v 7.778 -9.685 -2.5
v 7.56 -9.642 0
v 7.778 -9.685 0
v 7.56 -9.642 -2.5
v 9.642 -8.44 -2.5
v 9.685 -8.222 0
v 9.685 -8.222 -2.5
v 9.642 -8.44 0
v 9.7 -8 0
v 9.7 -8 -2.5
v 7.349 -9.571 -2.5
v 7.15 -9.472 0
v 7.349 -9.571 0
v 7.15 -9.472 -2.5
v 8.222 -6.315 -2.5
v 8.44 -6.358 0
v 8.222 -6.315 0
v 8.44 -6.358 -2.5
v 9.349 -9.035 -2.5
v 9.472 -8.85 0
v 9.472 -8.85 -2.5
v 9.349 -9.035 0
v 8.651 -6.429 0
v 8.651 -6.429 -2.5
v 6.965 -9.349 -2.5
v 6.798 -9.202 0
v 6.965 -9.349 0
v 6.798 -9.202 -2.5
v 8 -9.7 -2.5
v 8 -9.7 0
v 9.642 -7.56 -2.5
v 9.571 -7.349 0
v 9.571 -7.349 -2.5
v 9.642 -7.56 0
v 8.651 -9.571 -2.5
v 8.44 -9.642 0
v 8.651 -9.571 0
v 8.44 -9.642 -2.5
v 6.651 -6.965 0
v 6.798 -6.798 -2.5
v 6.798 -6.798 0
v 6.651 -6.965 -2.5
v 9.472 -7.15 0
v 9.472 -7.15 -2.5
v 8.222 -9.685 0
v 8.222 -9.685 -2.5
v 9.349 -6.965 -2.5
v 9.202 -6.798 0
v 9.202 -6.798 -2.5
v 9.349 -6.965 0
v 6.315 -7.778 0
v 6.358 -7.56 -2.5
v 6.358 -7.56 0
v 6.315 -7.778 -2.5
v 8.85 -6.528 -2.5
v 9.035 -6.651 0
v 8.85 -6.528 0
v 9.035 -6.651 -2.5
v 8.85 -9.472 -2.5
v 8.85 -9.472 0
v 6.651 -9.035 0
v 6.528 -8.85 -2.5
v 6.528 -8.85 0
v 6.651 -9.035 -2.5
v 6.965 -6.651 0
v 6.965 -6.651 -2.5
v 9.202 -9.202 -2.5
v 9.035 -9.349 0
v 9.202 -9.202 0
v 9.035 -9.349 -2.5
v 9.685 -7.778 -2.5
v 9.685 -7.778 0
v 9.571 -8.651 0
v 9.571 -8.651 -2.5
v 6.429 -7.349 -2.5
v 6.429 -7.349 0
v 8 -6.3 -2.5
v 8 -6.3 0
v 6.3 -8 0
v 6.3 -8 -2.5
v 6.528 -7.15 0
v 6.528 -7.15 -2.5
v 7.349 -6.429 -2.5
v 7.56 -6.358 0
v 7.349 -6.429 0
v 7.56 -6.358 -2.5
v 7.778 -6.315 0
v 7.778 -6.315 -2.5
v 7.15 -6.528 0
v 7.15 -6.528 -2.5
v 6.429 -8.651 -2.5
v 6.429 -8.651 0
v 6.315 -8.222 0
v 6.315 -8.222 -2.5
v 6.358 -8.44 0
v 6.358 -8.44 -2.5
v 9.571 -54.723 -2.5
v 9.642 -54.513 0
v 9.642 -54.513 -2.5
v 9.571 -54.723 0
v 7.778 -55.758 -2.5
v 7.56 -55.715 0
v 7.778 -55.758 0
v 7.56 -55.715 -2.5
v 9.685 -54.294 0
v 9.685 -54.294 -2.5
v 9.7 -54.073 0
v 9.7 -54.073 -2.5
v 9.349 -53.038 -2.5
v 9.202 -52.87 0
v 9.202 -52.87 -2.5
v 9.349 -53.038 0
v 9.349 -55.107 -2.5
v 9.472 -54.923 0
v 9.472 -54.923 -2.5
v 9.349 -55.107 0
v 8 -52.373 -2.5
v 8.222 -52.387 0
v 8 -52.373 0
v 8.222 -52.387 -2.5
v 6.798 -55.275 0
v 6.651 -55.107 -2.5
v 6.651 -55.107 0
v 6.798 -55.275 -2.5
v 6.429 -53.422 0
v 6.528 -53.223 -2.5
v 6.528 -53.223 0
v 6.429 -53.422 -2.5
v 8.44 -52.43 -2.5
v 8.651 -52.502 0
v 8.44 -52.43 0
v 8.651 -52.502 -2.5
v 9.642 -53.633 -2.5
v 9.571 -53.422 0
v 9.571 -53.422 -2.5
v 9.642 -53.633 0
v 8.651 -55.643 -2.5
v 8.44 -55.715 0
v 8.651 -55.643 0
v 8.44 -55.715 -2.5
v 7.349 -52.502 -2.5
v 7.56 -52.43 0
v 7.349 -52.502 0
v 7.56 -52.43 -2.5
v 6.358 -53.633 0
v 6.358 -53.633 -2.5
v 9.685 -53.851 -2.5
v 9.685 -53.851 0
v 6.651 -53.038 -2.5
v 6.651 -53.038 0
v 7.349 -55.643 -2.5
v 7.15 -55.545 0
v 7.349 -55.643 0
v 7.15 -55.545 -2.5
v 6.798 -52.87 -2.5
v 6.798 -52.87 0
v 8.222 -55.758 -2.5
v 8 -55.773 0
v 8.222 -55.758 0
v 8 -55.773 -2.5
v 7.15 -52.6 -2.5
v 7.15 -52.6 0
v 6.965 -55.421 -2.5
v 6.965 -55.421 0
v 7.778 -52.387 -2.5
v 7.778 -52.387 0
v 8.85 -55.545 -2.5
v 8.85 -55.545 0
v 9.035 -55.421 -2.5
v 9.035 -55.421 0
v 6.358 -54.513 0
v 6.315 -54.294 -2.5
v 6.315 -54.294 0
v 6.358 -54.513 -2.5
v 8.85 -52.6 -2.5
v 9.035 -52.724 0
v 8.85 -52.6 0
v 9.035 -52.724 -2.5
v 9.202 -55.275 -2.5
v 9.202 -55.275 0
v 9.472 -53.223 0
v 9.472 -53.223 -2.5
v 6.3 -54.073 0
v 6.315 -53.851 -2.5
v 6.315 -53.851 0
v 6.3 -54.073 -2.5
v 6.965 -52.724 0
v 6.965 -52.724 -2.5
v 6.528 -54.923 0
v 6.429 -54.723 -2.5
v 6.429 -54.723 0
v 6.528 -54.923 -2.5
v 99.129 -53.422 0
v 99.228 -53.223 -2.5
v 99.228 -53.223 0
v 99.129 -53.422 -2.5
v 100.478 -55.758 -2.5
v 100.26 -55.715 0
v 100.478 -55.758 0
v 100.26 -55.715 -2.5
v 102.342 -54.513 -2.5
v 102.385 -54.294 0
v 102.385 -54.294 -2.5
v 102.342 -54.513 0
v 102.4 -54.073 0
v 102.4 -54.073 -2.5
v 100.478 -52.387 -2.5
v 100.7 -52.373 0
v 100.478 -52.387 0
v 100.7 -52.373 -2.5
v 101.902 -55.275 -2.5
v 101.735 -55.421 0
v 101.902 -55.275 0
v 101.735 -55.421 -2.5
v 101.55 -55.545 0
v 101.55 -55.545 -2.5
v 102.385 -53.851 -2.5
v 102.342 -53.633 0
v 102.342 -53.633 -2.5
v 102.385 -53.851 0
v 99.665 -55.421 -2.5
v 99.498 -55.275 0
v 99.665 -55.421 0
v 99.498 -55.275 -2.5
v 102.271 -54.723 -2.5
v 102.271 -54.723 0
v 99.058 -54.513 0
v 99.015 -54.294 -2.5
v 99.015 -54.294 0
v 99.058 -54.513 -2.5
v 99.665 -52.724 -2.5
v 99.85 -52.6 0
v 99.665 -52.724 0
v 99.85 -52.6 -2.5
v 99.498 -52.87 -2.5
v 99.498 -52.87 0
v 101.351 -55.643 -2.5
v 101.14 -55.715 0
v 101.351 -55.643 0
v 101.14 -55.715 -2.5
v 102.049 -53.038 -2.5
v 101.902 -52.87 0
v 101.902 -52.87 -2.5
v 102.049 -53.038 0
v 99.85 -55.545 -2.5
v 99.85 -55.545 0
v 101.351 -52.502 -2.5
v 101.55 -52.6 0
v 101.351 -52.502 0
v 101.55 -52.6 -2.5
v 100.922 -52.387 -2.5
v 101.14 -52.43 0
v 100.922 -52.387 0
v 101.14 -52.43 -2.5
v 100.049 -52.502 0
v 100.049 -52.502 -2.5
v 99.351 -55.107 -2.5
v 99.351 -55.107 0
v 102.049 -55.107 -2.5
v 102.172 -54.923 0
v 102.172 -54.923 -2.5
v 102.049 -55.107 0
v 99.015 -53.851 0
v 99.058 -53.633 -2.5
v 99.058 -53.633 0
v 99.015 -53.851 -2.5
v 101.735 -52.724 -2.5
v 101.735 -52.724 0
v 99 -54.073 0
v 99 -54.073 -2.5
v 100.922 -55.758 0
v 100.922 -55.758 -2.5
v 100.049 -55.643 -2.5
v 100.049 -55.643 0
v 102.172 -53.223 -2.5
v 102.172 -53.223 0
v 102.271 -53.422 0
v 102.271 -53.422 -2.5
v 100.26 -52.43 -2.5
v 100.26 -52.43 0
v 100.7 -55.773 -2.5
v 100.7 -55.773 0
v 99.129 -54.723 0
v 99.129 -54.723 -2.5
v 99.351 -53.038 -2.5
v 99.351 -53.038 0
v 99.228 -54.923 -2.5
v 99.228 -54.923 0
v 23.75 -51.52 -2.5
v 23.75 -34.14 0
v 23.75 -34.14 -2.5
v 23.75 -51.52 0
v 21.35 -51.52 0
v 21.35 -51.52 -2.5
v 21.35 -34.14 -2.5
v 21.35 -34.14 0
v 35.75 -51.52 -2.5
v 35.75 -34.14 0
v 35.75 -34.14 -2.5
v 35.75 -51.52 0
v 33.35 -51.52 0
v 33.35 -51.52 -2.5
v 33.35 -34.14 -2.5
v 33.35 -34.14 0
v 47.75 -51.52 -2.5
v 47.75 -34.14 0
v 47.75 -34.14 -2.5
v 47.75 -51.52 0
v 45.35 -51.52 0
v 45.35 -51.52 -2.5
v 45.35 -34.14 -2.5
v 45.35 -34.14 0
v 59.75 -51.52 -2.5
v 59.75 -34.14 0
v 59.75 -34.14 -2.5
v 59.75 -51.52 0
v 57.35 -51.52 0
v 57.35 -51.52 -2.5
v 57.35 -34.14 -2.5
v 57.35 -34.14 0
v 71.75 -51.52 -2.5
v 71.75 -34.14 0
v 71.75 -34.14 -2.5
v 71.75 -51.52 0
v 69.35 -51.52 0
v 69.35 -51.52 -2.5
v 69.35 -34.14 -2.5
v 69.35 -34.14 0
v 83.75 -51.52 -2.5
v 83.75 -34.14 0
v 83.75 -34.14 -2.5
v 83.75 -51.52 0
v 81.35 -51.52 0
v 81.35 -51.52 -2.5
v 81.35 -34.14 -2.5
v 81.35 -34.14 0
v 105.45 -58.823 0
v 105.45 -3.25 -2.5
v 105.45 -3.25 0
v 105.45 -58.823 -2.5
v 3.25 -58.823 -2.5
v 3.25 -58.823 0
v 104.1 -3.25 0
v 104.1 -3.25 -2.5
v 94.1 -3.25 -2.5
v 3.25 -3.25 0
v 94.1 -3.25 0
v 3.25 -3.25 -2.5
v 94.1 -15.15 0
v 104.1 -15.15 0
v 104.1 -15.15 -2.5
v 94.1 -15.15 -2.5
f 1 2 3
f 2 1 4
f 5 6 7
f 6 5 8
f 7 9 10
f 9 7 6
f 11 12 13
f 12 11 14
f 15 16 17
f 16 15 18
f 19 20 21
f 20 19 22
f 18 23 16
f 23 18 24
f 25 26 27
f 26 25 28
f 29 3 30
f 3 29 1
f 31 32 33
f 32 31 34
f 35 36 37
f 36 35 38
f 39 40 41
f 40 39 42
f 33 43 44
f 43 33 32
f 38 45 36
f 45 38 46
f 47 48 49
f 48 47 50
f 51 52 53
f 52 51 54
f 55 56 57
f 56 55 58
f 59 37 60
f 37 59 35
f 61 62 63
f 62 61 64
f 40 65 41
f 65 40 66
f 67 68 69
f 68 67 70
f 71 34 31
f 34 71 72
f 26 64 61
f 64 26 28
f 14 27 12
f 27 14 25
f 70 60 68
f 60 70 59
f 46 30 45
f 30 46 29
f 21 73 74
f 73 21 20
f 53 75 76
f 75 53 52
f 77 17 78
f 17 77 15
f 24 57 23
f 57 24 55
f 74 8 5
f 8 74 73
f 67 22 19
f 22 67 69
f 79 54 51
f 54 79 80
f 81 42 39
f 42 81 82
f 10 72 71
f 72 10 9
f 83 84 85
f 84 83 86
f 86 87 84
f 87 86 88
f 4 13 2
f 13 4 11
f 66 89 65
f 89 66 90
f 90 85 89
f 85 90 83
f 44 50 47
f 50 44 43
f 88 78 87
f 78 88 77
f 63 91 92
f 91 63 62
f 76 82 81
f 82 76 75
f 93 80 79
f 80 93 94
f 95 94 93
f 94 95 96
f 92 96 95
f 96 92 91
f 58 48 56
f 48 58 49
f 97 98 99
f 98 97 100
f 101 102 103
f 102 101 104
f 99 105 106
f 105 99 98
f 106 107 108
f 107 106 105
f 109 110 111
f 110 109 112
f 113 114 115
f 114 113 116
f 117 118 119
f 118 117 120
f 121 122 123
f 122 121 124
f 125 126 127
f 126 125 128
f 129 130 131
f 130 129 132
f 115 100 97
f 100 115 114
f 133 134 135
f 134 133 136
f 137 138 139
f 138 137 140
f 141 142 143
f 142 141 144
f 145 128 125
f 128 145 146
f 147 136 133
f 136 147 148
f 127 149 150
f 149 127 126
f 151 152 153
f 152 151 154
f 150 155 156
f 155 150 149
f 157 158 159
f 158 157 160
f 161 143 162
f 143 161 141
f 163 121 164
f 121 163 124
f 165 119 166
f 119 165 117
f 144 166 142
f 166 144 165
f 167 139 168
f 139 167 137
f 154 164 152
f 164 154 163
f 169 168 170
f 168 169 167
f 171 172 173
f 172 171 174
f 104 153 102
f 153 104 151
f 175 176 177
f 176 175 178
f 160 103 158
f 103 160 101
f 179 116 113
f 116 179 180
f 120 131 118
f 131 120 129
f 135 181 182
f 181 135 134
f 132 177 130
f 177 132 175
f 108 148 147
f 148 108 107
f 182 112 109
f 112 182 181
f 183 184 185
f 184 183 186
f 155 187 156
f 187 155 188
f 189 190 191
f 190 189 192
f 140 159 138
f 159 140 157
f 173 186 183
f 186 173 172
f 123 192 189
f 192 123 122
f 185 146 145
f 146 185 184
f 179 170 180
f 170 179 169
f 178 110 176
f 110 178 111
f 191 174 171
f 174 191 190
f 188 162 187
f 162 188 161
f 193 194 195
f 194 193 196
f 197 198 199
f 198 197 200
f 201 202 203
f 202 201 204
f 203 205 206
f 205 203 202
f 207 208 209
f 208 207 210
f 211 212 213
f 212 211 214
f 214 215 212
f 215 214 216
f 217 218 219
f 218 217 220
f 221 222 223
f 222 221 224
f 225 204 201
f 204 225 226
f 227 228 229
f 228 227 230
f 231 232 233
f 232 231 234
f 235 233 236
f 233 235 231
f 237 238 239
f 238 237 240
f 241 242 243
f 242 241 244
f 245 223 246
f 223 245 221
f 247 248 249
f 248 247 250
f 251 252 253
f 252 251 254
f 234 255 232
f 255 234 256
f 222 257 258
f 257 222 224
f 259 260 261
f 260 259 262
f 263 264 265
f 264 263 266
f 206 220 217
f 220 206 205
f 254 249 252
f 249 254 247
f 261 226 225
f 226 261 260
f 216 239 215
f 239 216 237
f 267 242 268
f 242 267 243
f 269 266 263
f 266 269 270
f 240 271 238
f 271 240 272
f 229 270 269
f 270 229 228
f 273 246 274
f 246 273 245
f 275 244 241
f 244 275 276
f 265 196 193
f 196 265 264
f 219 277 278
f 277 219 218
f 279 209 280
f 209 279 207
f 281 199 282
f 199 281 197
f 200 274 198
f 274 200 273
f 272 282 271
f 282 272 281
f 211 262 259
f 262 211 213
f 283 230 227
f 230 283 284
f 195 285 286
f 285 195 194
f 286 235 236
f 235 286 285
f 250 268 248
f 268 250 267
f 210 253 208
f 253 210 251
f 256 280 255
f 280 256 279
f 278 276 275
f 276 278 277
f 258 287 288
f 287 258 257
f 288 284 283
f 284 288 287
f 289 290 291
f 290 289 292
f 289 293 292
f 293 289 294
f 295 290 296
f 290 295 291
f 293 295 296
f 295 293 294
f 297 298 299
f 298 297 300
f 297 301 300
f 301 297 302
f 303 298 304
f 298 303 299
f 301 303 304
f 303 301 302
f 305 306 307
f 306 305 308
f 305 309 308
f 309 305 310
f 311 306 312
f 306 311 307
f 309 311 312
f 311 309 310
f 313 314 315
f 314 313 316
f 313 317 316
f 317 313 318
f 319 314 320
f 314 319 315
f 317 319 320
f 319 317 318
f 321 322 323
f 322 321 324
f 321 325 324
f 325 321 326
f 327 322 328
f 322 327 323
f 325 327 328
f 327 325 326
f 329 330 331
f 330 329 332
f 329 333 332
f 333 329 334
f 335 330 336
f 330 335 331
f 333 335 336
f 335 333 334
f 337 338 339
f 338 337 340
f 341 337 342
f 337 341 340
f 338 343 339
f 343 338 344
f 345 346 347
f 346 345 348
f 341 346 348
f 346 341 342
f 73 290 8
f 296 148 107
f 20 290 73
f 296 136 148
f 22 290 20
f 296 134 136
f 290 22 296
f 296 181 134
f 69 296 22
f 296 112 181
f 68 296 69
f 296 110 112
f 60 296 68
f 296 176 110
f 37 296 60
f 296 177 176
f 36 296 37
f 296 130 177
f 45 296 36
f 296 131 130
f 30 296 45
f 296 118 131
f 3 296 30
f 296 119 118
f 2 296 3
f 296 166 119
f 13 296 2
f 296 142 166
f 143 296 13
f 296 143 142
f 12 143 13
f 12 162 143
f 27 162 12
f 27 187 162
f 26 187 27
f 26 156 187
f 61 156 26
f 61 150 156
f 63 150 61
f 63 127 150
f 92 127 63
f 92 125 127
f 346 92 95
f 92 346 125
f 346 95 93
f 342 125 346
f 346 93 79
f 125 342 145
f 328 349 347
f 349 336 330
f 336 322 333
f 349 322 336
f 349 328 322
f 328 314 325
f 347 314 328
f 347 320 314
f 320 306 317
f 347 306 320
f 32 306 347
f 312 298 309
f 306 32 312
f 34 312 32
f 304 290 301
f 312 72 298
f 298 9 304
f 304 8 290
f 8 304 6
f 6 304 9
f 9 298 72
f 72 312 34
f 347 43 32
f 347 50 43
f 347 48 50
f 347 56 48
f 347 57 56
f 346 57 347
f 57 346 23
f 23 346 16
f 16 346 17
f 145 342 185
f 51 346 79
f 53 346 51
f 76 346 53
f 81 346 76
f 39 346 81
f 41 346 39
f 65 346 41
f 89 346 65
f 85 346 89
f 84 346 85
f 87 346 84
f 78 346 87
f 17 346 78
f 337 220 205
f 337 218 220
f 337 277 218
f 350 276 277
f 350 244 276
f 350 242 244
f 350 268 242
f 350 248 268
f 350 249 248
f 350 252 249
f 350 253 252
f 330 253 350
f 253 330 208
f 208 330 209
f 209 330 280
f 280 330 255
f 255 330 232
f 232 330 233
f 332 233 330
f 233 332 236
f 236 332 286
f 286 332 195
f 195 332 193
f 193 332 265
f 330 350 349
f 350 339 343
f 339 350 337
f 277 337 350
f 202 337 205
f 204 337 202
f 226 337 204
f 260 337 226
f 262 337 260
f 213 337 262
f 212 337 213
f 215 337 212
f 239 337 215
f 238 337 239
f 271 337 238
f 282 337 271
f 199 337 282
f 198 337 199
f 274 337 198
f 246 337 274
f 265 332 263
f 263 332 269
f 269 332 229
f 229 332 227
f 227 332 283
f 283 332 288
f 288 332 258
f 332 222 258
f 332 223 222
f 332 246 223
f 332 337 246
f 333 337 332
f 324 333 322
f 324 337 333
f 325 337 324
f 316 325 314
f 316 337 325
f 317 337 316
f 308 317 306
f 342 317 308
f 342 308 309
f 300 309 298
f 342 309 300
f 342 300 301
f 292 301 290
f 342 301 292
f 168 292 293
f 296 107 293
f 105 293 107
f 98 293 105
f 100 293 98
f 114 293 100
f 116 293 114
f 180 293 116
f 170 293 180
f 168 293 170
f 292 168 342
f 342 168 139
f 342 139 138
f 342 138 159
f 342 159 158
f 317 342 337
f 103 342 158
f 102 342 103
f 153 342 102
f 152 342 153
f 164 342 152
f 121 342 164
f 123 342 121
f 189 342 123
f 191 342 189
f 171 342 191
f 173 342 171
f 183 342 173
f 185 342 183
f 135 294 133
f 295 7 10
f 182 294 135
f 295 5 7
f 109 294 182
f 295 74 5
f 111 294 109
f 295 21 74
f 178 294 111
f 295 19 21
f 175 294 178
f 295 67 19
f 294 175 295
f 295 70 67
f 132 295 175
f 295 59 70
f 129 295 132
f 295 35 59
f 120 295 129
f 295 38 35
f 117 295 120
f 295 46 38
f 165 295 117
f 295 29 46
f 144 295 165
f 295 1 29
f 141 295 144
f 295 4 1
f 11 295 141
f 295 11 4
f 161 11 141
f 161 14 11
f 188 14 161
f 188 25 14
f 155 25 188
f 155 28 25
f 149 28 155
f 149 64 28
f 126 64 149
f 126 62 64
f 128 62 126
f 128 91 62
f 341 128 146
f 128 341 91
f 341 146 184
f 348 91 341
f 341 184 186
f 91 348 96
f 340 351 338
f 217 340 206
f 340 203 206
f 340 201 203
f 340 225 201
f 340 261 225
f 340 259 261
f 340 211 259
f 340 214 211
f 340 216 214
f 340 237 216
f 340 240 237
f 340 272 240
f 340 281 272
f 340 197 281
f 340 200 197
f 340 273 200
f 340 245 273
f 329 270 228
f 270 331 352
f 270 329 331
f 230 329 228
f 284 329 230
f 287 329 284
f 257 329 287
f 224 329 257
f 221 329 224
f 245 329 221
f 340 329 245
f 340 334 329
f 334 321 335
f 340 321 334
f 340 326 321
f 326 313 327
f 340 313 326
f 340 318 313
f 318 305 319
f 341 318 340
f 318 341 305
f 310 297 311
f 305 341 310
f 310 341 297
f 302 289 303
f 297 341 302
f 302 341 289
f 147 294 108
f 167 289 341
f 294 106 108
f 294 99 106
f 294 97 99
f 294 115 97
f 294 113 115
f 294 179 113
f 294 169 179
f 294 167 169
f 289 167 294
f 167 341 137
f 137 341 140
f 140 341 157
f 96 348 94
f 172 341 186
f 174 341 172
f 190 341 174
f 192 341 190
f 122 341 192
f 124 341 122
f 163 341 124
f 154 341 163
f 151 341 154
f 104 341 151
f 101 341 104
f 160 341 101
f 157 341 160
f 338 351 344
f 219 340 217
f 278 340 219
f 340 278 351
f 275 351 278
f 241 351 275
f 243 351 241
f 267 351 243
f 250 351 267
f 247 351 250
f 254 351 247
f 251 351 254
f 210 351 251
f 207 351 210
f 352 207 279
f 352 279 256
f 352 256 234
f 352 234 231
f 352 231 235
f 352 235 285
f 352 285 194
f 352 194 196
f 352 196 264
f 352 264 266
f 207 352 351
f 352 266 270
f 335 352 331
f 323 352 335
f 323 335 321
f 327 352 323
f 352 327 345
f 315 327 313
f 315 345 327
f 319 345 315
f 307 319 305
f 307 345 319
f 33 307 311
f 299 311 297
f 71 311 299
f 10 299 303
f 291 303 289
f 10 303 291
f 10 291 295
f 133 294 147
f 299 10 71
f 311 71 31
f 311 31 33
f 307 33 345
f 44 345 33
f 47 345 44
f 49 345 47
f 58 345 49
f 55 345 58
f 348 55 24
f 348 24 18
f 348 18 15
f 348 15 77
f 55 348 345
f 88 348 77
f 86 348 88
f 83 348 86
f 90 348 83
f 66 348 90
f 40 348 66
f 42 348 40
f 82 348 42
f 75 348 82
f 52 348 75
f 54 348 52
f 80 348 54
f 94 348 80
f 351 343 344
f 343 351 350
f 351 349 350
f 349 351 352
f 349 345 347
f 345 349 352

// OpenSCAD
// =====================================================================
//  CYD ADS-B RADAR — 30° wedge console enclosure
//  Board: ESP32-2432S028R "Cheap Yellow Display", dual-USB variant
//  Landscape, SD end = LEFT, USB end = RIGHT (internal cable pocket),
//  cable exits low through the rear panel.
//
//  Parts:  part = "assembly"    exploded-ish preview with ghost board
//                 "body"        wedge body, as-installed orientation
//                 "body_print"  wedge body, bezel face down (print this)
//                 "panel"       rear panel (prints flat as-is)
//                 "fit_test"    bezel face + bosses only — print FIRST
//
//  Hardware: 4x M3x6 self-tap (board -> bezel bosses)
//            4x M3x8 self-tap (panel -> corner bosses)
// =====================================================================

part       = "panel";
show_board = true;          // ghost board in assembly view
$fn = 48;

/* ---------------- board — VERIFY tagged values with calipers ------- */
board_w    = 86.5;
board_h    = 50.0;
board_t    = 1.6;
hole_d     = 3.2;
hole_inset = 4.0;   // VERIFY: mounting hole centre inset from corners
glass_lift = 4.0;    // VERIFY: glass surface height above PCB top
disp_w     = 69.5;   // VERIFY: display module (metal frame) outline, lateral
disp_h     = 50.5;   // VERIFY: module outline, along slant
disp_du    = 0;      // VERIFY: module centre offset from board centre (+ = toward USB)
disp_dv    = 0;      // VERIFY: module centre offset along slant
view_du = -3;   // aperture offset within the module — display active area
                // sits left-of-centre (3mm dead border on the right side)
view_dv = 0;    // same idea vertically, if it ever needs it
view_w     = 60.0;   // bezel opening (active area is 57.6 x 43.2)
view_h     = 45.0;
sd_dv      = 0;      // VERIFY: microSD position along left edge
comp_back  = 12;     // clearance behind PCB (ESP32 can, connectors)

/* ---------------- enclosure ---------------- */
tilt         = 30;    // back-tilt, degrees
wall         = 3.0;
lip          = 1.2;   // bezel overlap onto glass edge
glass_gap    = 0.3;   // air gap between lip underside and glass
clr          = 0.6;   // board fit clearance
usb_pocket   = 15;    // extra cavity width, USB side (plug + 90° bend)
D            = 55;    // overall depth front-toe to back
panel_t      = 2.5;
fit          = 0.25;  // panel fit clearance
boss_d       = 7;
pilot_d      = 2.6;   // M3 self-tap pilot
clear_d      = 3.4;   // M3 clearance
cable_slot_w = 10;
cable_slot_h = 12;
chin      = 10;   // foot height below the screen face
chin_rake = 15;   // chin leans back this many degrees.
                  // At tilt=30, rake >= 15 keeps the chin printable
                  // face-down (<= 45° overhang). Also looks less like a doorstop.

/* ---------------- derived ---------------- */
standoff_h = lip + glass_gap + glass_lift - wall;   // inner face -> PCB top
cav_slant  = board_h + 2*clr + 2;                   // cavity length along slant
int_w      = board_w + 2*clr + usb_pocket;          // cavity width
out_w      = int_w + 2*wall;                        // overall width
bcx        = wall + clr + board_w/2;                // board centre, global X
pcb_depth  = wall + standoff_h;                     // outer face -> PCB top
cable_x    = bcx + board_w/2 + 4 + cable_slot_w/2;  // rear slot centre
ldr_du = -(board_w/2 - hole_inset);        // same column as the left holes
ldr_dv = -(board_h/2 - hole_inset) + 7;    // ~9mm above hole centre — VERIFY
top_z = chin + cav_slant*cos(tilt) + 2*wall;
s_c   = (top_z - chin) / (2*cos(tilt));

assert(standoff_h >= 0.8,
  "standoff_h too small — thin the wall or check glass_lift");

/* ---------------- helpers ---------------- */
// extrude a 2D side profile (drawn as [depth, height]) along X
module extrude_x(l) { rotate([90,0,90]) linear_extrude(height=l) children(); }

// face frame: origin on OUTER bezel surface, +Z out of the face,
// fx = lateral (global X), fs = distance up the slant from the toe
module on_face(fx, fs) {
  translate([fx, fs*sin(tilt), chin + fs*cos(tilt)])
    rotate([90 - tilt, 0, 0]) children();
}
// same, relative to board centre
module on_board(u, v) { on_face(bcx + u, s_c + v) children(); }

/* ---------------- profiles ---------------- */
module prof_out() {
  polygon([[chin*tan(chin_rake), 0], [0, chin],
           [(top_z - chin)*tan(tilt), top_z], [D, top_z], [D, 0]]);
}
module prof_cav() {
  offset(delta = -wall)
    polygon([[chin*tan(chin_rake), 0], [0, chin],
             [(top_z - chin)*tan(tilt), top_z], [D + 20, top_z], [D + 20, 0]]);
}

/* ---------------- panel boss layout ---------------- */
pb = [[wall + 5,          wall + 5],
      [out_w - wall - 5,  wall + 5],
      [wall + 5,          top_z - wall - 5],
      [out_w - wall - 5,  top_z - wall - 5]];
pboss_len = 12;

/* ---------------- wedge body ---------------- */
module body() {
  difference() {
    union() {
      // shell = outline minus cavity, done FIRST so the bosses
      // added below survive (previously the cavity cut ate them)
      difference() {
        extrude_x(out_w) prof_out();
        translate([wall, 0, 0]) extrude_x(int_w) prof_cav();
      }
      // board standoff bosses on the inner bezel face
      for (sx = [-1,1], sy = [-1,1])
        on_board(sx*(board_w/2 - hole_inset), sy*(board_h/2 - hole_inset))
          translate([0,0, -wall - standoff_h])
            cylinder(h = standoff_h + 0.02, d = boss_d);
      // rear panel bosses — fattened so they fuse into the corner walls
      for (p = pb)
        translate([p[0], D - pboss_len, p[1]])
          rotate([-90,0,0]) cylinder(h = pboss_len, d = boss_d + 3);
    }

// view aperture
    on_board(disp_du + view_du, disp_dv + view_dv)
      cube([view_w, view_h, 4*wall], center = true);

    // display module pocket
    on_board(disp_du, disp_dv)
      translate([0,0, -lip - 7.5])
        cube([disp_w + 0.6, disp_h + 0.6, 15], center = true);

    // LDR light path + chamfer
    on_board(ldr_du, ldr_dv) {
      translate([0,0, -wall - 1]) cylinder(h = wall + 2, d = 3);
      translate([0,0, -1.2]) cylinder(h = 1.25, d1 = 3, d2 = 5.5);
    }

    // board screw pilots
    for (sx = [-1,1], sy = [-1,1])
      on_board(sx*(board_w/2 - hole_inset), sy*(board_h/2 - hole_inset))
        translate([0,0, -wall - standoff_h - 0.1])
          cylinder(h = standoff_h + wall - 1, d = pilot_d);

    // panel screw pilots
    for (p = pb)
      translate([p[0], D + 1, p[1]])
        rotate([90,0,0]) cylinder(h = pboss_len - 1, d = pilot_d);
  }
}

/* ---------------- rear panel ---------------- */
module panel() {
  px0 = wall + fit;  px1 = out_w - wall - fit;
  pz0 = wall + fit;  pz1 = top_z - wall - fit;
  difference() {
    translate([px0, D - panel_t, pz0])
      cube([px1 - px0, panel_t, pz1 - pz0]);
    // screw clearance
    for (p = pb)
      translate([p[0], D + 1, p[1]])
        rotate([90,0,0]) cylinder(h = panel_t + 2, d = clear_d);
    // cable exit notch, bottom edge, over the USB pocket
    translate([cable_x - cable_slot_w/2, D - panel_t - 1, pz0 - 0.1])
      cube([cable_slot_w, panel_t + 2, cable_slot_h]);
    // vents
    for (i = [0:5])
      translate([out_w/2 - 33 + i*12, D - panel_t - 1, top_z*0.55])
        cube([2.4, panel_t + 2, top_z*0.28]);
  }
}

/* ---------------- ghost board ---------------- */
module board_mock() {
  color("green", 0.4) on_board(0, 0)
    translate([0,0, -pcb_depth - board_t/2])
      cube([board_w, board_h, board_t], center = true);
  color("grey", 0.4) on_board(disp_du, disp_dv)
    translate([0,0, -pcb_depth + glass_lift/2])
      cube([disp_w, disp_h, glass_lift], center = true);
}

/* ---------------- part selection ---------------- */
if (part == "assembly") {
  body();
  color("orange", 0.7) panel();
  if (show_board) board_mock();
}
if (part == "body")       body();
if (part == "body_print") rotate([90 + tilt, 0, 0]) body();
if (part == "panel")      rotate([90, 0, 0]) translate([0, -D, 0]) panel();
if (part == "fit_test")
  rotate([90 + tilt, 0, 0]) intersection() {
    body();
    on_board(0, 0)
      translate([0,0, -(wall + standoff_h + 3)/2 + 0.5])
        cube([out_w*2, 200, wall + standoff_h + 4], center = true);
  }
